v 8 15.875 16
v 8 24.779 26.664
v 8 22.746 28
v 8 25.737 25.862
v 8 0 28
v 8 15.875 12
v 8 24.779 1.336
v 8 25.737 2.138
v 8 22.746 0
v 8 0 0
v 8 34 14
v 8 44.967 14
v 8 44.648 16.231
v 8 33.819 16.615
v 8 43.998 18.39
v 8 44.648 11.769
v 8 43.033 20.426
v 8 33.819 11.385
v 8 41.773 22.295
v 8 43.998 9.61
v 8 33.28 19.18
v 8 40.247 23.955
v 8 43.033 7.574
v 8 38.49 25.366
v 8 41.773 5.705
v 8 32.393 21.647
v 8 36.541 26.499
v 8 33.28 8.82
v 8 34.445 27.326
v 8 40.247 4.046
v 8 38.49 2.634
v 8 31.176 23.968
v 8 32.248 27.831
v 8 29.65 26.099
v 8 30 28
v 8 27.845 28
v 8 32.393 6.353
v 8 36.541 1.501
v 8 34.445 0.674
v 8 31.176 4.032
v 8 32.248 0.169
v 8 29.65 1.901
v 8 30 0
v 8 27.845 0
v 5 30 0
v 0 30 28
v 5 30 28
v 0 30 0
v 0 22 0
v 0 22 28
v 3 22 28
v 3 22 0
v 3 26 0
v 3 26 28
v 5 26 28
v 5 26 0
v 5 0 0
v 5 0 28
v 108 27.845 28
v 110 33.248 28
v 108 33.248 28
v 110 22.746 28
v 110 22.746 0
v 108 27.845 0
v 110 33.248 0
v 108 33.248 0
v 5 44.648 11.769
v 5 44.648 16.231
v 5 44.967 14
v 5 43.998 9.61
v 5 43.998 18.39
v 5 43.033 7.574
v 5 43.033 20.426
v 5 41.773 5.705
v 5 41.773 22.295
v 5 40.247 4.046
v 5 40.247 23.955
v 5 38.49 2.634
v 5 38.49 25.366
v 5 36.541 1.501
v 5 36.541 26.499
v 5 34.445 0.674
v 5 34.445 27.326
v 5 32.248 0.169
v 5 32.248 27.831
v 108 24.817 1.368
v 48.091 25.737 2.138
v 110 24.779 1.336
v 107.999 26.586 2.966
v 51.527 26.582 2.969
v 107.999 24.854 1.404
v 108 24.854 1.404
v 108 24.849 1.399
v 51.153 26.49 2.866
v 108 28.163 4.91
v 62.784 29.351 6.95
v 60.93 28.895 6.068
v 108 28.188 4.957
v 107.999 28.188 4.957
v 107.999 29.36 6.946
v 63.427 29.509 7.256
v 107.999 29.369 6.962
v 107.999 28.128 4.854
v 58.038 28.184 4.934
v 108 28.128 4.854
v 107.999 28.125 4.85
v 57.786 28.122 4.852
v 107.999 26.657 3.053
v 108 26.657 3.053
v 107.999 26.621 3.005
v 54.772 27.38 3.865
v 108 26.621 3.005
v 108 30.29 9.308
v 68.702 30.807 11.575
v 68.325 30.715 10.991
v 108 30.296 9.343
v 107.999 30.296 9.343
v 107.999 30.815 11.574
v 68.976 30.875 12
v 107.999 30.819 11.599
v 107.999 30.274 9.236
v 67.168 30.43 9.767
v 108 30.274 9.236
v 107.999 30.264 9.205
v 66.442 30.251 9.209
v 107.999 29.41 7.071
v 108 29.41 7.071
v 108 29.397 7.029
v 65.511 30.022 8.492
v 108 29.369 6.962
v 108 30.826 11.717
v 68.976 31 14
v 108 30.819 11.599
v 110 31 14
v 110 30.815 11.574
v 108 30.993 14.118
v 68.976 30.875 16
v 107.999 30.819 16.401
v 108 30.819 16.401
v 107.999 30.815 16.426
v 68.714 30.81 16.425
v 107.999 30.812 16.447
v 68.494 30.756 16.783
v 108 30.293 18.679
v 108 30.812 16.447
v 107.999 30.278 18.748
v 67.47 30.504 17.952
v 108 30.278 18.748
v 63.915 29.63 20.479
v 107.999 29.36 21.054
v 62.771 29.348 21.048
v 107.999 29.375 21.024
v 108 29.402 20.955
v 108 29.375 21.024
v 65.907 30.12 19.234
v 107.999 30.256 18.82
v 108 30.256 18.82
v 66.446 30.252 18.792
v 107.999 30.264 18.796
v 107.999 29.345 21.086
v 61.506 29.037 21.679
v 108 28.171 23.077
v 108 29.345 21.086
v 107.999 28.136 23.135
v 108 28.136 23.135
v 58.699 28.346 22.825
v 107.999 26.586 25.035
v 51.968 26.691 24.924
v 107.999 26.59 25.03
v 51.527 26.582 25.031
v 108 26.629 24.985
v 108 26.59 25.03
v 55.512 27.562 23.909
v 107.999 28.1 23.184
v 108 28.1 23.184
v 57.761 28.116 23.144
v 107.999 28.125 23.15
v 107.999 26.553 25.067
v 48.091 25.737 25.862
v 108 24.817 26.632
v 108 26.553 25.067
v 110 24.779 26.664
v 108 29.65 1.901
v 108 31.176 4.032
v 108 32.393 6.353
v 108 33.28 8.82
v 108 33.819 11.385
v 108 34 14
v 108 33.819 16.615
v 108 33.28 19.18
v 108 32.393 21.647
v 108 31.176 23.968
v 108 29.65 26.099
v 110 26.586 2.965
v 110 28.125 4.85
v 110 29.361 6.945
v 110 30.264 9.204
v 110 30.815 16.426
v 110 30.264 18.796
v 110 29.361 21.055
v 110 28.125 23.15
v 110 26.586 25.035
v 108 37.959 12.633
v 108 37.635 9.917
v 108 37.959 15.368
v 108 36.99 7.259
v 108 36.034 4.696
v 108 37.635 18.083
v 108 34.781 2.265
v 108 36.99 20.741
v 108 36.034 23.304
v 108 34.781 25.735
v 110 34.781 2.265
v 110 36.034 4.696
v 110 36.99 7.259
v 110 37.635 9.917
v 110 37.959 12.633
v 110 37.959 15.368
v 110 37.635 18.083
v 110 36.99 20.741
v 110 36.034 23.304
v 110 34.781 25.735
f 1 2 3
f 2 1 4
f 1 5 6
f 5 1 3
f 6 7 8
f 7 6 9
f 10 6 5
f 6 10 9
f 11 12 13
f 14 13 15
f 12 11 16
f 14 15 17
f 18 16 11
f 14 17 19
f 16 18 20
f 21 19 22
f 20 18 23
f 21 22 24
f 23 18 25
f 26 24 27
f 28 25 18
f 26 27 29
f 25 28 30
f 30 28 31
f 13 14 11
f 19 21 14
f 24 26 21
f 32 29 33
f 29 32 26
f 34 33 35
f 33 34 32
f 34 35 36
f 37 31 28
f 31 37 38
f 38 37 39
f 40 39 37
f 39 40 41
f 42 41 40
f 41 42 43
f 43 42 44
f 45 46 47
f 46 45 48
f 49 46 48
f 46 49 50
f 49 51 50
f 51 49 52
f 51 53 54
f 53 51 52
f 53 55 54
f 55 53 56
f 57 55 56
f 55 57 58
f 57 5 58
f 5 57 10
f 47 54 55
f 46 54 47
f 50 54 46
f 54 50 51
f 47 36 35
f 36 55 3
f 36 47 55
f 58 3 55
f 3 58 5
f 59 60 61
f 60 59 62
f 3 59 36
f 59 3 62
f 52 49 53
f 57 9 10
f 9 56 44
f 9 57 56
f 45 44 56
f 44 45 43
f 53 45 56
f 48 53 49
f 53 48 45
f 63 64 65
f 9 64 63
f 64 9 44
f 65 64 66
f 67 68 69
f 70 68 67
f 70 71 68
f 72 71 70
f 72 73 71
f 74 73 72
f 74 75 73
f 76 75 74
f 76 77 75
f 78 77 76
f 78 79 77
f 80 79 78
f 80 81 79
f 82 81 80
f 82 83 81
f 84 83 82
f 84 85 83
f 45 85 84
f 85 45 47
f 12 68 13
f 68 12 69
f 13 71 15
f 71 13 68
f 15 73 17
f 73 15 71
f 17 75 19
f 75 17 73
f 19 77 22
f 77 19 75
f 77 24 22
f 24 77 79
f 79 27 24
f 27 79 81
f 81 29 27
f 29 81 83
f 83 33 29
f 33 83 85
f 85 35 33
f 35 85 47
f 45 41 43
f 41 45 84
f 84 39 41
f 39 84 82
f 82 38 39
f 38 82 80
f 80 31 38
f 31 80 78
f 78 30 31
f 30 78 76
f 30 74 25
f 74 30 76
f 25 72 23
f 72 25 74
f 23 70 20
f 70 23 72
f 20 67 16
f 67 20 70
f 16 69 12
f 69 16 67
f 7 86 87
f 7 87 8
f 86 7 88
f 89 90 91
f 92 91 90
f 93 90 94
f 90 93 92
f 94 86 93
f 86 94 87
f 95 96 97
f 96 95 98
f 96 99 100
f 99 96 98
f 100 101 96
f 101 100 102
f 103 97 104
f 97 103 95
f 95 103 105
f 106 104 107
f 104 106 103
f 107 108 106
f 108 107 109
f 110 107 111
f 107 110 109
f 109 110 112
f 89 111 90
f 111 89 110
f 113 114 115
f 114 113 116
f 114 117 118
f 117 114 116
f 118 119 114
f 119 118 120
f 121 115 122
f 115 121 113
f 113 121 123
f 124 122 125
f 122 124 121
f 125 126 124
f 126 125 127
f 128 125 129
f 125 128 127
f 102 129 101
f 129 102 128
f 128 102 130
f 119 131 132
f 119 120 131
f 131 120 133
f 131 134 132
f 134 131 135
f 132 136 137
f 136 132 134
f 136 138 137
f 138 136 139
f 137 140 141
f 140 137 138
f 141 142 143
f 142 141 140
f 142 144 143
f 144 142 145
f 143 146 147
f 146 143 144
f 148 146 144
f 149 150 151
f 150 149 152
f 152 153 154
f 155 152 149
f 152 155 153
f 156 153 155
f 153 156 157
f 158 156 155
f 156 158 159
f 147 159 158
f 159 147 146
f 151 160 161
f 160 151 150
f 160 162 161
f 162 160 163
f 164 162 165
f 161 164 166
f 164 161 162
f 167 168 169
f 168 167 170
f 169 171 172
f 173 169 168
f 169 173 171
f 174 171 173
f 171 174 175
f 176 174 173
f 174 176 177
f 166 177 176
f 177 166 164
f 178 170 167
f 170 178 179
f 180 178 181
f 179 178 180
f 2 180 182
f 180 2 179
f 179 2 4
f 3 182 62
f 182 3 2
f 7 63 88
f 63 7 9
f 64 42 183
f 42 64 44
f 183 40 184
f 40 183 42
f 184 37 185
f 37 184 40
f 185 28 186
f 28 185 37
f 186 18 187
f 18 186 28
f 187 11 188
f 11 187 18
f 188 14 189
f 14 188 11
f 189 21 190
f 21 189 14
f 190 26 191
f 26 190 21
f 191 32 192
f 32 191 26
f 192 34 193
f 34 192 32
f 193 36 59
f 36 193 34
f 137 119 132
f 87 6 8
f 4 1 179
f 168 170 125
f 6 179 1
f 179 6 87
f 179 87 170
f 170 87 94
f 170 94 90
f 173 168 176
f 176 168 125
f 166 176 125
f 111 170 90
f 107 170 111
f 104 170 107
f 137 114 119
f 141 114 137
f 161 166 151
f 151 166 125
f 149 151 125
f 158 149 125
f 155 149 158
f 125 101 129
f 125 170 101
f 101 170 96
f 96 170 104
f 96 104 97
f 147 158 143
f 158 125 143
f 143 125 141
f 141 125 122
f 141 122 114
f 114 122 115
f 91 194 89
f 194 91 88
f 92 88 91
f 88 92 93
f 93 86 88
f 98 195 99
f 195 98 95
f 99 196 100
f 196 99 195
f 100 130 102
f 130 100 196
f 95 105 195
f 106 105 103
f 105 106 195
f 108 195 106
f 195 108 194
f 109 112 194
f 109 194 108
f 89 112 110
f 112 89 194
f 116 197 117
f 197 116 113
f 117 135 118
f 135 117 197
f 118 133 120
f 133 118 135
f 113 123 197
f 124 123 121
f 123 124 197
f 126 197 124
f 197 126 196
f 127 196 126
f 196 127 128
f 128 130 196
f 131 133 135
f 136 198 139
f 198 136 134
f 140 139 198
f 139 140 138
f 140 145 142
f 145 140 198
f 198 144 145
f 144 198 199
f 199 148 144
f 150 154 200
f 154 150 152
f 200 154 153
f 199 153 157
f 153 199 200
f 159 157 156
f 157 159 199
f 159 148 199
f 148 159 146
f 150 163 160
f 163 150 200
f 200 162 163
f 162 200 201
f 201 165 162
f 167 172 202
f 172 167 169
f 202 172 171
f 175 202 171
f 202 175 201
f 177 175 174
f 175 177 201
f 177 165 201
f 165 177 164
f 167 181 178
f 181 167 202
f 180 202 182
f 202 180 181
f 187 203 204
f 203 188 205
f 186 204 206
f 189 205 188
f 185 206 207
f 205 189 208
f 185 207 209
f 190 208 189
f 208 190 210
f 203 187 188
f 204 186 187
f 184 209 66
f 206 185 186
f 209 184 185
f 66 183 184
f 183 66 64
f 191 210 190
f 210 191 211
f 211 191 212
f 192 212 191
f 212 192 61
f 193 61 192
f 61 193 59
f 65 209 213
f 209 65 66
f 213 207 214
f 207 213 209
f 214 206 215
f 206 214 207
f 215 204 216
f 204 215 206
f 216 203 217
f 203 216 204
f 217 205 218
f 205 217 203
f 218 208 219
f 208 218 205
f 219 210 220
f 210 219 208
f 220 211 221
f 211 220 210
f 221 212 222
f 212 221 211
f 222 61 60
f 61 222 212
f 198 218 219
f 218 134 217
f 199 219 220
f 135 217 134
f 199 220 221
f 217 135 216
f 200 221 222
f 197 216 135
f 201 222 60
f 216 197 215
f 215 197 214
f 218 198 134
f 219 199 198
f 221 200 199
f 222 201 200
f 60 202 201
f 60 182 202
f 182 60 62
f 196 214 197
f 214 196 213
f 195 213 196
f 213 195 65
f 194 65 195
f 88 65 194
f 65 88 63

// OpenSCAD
// Remix of "Spool Holder 1KG for NEO GRRF" ( http://www.thingiverse.com/thing:385773 ) by Luchador

// Laurenz 2014-07-06

// of spool holding middle part (use spool width + 5mm)
length = 100;



// Anfangsstueck mit Haken
difference(){
luchadorspool();
translate([8,0,0])cube([100,100,100]);
}

// Skalierter Mittelteil
translate([8,0,0])
scale([length/82,1,1])
translate([-8,0,0])
difference(){
luchadorspool();
union(){
cube([8-0.001,200,200]);
translate([90,0,0])cube([100,100,100]);
}
}

// Endstueck
translate([-82+length,0,0])
difference(){
luchadorspool();
translate([-1,-1,-1])cube([91-0.001,100,100]);
}

// created with STL to OpenSCAD converter ( http://www.thingiverse.com/thing:62666 ) ( http://jsfiddle.net/Riham/yzvGD/embedded/result/ )
module luchadorspool(scale) {polyhedron(
 points=[[8,24.779094696044922,26.663768768310547],[8,22.745990753173828,28.000051498413086],[8,0.00002421438694000244,28.000051498413086],[8,24.779094696044922,1.336330771446228],[8,25.736982345581055,2.1375997066497803],[8,15.874530792236328,12.00005054473877],[8,25.736982345581055,25.862499237060547],[8,24.779094696044922,26.663768768310547],[8,15.874530792236328,16.000051498413086],[8,15.874530792236328,16.000051498413086],[8,24.779094696044922,26.663768768310547],[8,0.00002421438694000244,28.000051498413086],[8,15.874530792236328,16.000051498413086],[8,0.00002421438694000244,28.000051498413086],[8,15.874530792236328,12.00005054473877],[8,15.874530792236328,12.00005054473877],[8,0.00002421438694000244,28.000051498413086],[8,0.00002421438694000244,0.000050000002374872565],[8,15.874530792236328,12.00005054473877],[8,0.00002421438694000244,0.000050000002374872565],[8,24.779094696044922,1.336330771446228],[8,24.779094696044922,1.336330771446228],[8,0.00002421438694000244,0.000050000002374872565],[8,22.745990753173828,0.000050000002374872565],[40.87483596801758,25.736982345581055,2.1375997066497803],[8,25.736982345581055,2.1375997066497803],[8,24.779094696044922,1.336330771446228],[92,26.586090087890625,2.965418577194214],[43.692378997802734,26.582246780395508,2.9689066410064697],[92,24.779094696044922,1.336330771446228],[92,24.779094696044922,1.336330771446228],[43.692378997802734,26.582246780395508,2.9689066410064697],[43.38553237915039,26.490190505981445,2.8655965328216553],[92,24.779094696044922,1.336330771446228],[43.38553237915039,26.490190505981445,2.8655965328216553],[40.87483596801758,25.736982345581055,2.1375997066497803],[51.4024772644043,28.895273208618164,6.067709445953369],[92,28.125194549560547,4.849645614624023],[52.92253112792969,29.35129165649414,6.950313568115234],[52.92253112792969,29.35129165649414,6.950313568115234],[92,28.125194549560547,4.849645614624023],[92,29.360822677612305,6.945445537567139],[52.92253112792969,29.35129165649414,6.950313568115234],[92,29.360822677612305,6.945445537567139],[53.44977569580078,29.509464263916016,7.256449222564697],[51.4024772644043,28.895273208618164,6.067709445953369],[49.031253814697266,28.18390655517578,4.934443950653076],[92,28.125194549560547,4.849645614624023],[92,28.125194549560547,4.849645614624023],[49.031253814697266,28.18390655517578,4.934443950653076],[48.824859619140625,28.12198829650879,4.852006435394287],[92,28.125194549560547,4.849645614624023],[48.824859619140625,28.12198829650879,4.852006435394287],[92,26.586090087890625,2.965418577194214],[92,26.586090087890625,2.965418577194214],[48.824859619140625,28.12198829650879,4.852006435394287],[46.35269546508789,27.380340576171875,3.864579439163208],[92,26.586090087890625,2.965418577194214],[46.35269546508789,27.380340576171875,3.864579439163208],[43.692378997802734,26.582246780395508,2.9689066410064697],[57.46689987182617,30.714601516723633,10.99138355255127],[92,30.264408111572266,9.204360961914062],[57.77556610107422,30.807201385498047,11.575401306152344],[57.77556610107422,30.807201385498047,11.575401306152344],[92,30.264408111572266,9.204360961914062],[92,30.81505012512207,11.5741605758667],[57.77556610107422,30.807201385498047,11.575401306152344],[92,30.81505012512207,11.5741605758667],[58,30.874530792236328,12.00005054473877],[57.46689987182617,30.714601516723633,10.99138355255127],[56.517704010009766,30.42984390258789,9.766770362854004],[92,30.264408111572266,9.204360961914062],[92,30.264408111572266,9.204360961914062],[56.517704010009766,30.42984390258789,9.766770362854004],[55.92249298095703,30.251279830932617,9.20854663848877],[92,30.264408111572266,9.204360961914062],[55.92249298095703,30.251279830932617,9.20854663848877],[92,29.360822677612305,6.945445537567139],[92,29.360822677612305,6.945445537567139],[55.92249298095703,30.251279830932617,9.20854663848877],[55.158836364746094,30.02218246459961,8.492351531982422],[92,29.360822677612305,6.945445537567139],[55.158836364746094,30.02218246459961,8.492351531982422],[53.44977569580078,29.509464263916016,7.256449222564697],[58,30.874530792236328,12.00005054473877],[92,30.81505012512207,11.5741605758667],[58,31.000022888183594,14.00005054473877],[58,31.000022888183594,14.00005054473877],[92,30.81505012512207,11.5741605758667],[92,31.000022888183594,14.00005054473877],[58,31.000022888183594,14.00005054473877],[92,31.000022888183594,14.00005054473877],[58,30.874530792236328,16.000051498413086],[58,30.874530792236328,16.000051498413086],[92,31.000022888183594,14.00005054473877],[92,30.81505012512207,16.425941467285156],[58,30.874530792236328,16.000051498413086],[92,30.81505012512207,16.425941467285156],[57.78570556640625,30.810243606567383,16.425212860107422],[57.78570556640625,30.810243606567383,16.425212860107422],[92,30.81505012512207,16.425941467285156],[57.60542297363281,30.75615882873535,16.782894134521484],[57.60542297363281,30.75615882873535,16.782894134521484],[92,30.81505012512207,16.425941467285156],[92,30.264408111572266,18.795740127563477],[57.60542297363281,30.75615882873535,16.782894134521484],[92,30.264408111572266,18.795740127563477],[56.765594482421875,30.504209518432617,17.952293395996094],[52.91258239746094,29.34830665588379,21.048480987548828],[53.850196838378906,29.62959098815918,20.47892189025879],[92,29.360822677612305,21.05465316772461],[92,29.360822677612305,21.05465316772461],[53.850196838378906,29.62959098815918,20.47892189025879],[55.484127044677734,30.119770050048828,19.23390769958496],[92,29.360822677612305,21.05465316772461],[55.484127044677734,30.119770050048828,19.23390769958496],[92,30.264408111572266,18.795740127563477],[92,30.264408111572266,18.795740127563477],[55.484127044677734,30.119770050048828,19.23390769958496],[55.9259033203125,30.252304077148438,18.792081832885742],[92,30.264408111572266,18.795740127563477],[55.9259033203125,30.252304077148438,18.792081832885742],[56.765594482421875,30.504209518432617,17.952293395996094],[52.91258239746094,29.34830665588379,21.048480987548828],[92,29.360822677612305,21.05465316772461],[51.87522506713867,29.037099838256836,21.678625106811523],[51.87522506713867,29.037099838256836,21.678625106811523],[92,29.360822677612305,21.05465316772461],[92,28.125194549560547,23.150455474853516],[51.87522506713867,29.037099838256836,21.678625106811523],[92,28.125194549560547,23.150455474853516],[49.573028564453125,28.3464412689209,22.824626922607422],[43.691871643066406,26.582094192504883,25.03069496154785],[44.053531646728516,26.69059181213379,24.923906326293945],[92,26.586090087890625,25.03468132019043],[92,26.586090087890625,25.03468132019043],[44.053531646728516,26.69059181213379,24.923906326293945],[46.9597053527832,27.562442779541016,23.90891456604004],[92,26.586090087890625,25.03468132019043],[46.9597053527832,27.562442779541016,23.90891456604004],[92,28.125194549560547,23.150455474853516],[92,28.125194549560547,23.150455474853516],[46.9597053527832,27.562442779541016,23.90891456604004],[48.80404281616211,28.11574363708496,23.143686294555664],[92,28.125194549560547,23.150455474853516],[48.80404281616211,28.11574363708496,23.143686294555664],[49.573028564453125,28.3464412689209,22.824626922607422],[43.691871643066406,26.582094192504883,25.03069496154785],[92,26.586090087890625,25.03468132019043],[40.87483596801758,25.736982345581055,25.862499237060547],[40.87483596801758,25.736982345581055,25.862499237060547],[92,26.586090087890625,25.03468132019043],[92,24.779094696044922,26.663768768310547],[40.87483596801758,25.736982345581055,25.862499237060547],[92,24.779094696044922,26.663768768310547],[8,25.736982345581055,25.862499237060547],[8,25.736982345581055,25.862499237060547],[92,24.779094696044922,26.663768768310547],[8,24.779094696044922,26.663768768310547],[8,24.779094696044922,26.663768768310547],[92,24.779094696044922,26.663768768310547],[92,22.745990753173828,28.000051498413086],[8,24.779094696044922,26.663768768310547],[92,22.745990753173828,28.000051498413086],[8,22.745990753173828,28.000051498413086],[40.87483596801758,25.736982345581055,2.1375997066497803],[8,24.779094696044922,1.336330771446228],[92,24.779094696044922,1.336330771446228],[92,24.779094696044922,1.336330771446228],[8,24.779094696044922,1.336330771446228],[8,22.745990753173828,0.000050000002374872565],[92,24.779094696044922,1.336330771446228],[8,22.745990753173828,0.000050000002374872565],[92,22.745990753173828,0.000050000002374872565],[2.423311710667139e-15,30.000022888183594,0.000050000002374872565],[2.423311710667139e-15,30.000022888183594,28.000051498413086],[5,30.000022888183594,0.000050000002374872565],[5,30.000022888183594,0.000050000002374872565],[2.423311710667139e-15,30.000022888183594,28.000051498413086],[5,30.000022888183594,28.000051498413086],[8,34.44451904296875,0.6736247539520264],[8,31.175521850585938,4.0324387550354],[8,29.64979362487793,1.9011133909225464],[8,27.845256805419922,0.000050000002374872565],[8,30.000022888183594,0.000050000002374872565],[8,29.64979362487793,1.9011133909225464],[8,29.64979362487793,1.9011133909225464],[8,30.000022888183594,0.000050000002374872565],[8,32.24764633178711,0.1693996638059616],[8,29.64979362487793,1.9011133909225464],[8,32.24764633178711,0.1693996638059616],[8,34.44451904296875,0.6736247539520264],[8,33.8192253112793,16.614952087402344],[8,43.03263854980469,20.426424026489258],[8,33.28026580810547,19.180086135864258],[8,33.28026580810547,19.180086135864258],[8,43.03263854980469,20.426424026489258],[8,41.77272033691406,22.295406341552734],[8,33.28026580810547,19.180086135864258],[8,41.77272033691406,22.295406341552734],[8,32.393402099609375,21.646636962890625],[8,43.03263854980469,7.573676586151123],[8,33.8192253112793,11.385149002075195],[8,33.28026580810547,8.820013999938965],[8,34.44451904296875,0.6736247539520264],[8,36.541038513183594,1.5013397932052612],[8,31.175521850585938,4.0324387550354],[8,31.175521850585938,4.0324387550354],[8,36.541038513183594,1.5013397932052612],[8,38.4898567199707,2.6338553428649902],[8,31.175521850585938,4.0324387550354],[8,38.4898567199707,2.6338553428649902],[8,32.393402099609375,6.353463172912598],[8,32.393402099609375,6.353463172912598],[8,38.4898567199707,2.6338553428649902],[8,40.24697494506836,4.04559850692749],[8,32.393402099609375,6.353463172912598],[8,40.24697494506836,4.04559850692749],[8,33.28026580810547,8.820013999938965],[8,33.28026580810547,8.820013999938965],[8,40.24697494506836,4.04559850692749],[8,41.77272033691406,5.704692840576172],[8,33.28026580810547,8.820013999938965],[8,41.77272033691406,5.704692840576172],[8,43.03263854980469,7.573676586151123],[8,30.000022888183594,28.000051498413086],[8,27.845256805419922,28.000051498413086],[8,32.24764633178711,27.83070182800293],[8,32.24764633178711,27.83070182800293],[8,27.845256805419922,28.000051498413086],[8,29.64979362487793,26.098987579345703],[8,32.24764633178711,27.83070182800293],[8,29.64979362487793,26.098987579345703],[8,34.44451904296875,27.326475143432617],[8,34.44451904296875,27.326475143432617],[8,29.64979362487793,26.098987579345703],[8,31.175521850585938,23.967660903930664],[8,41.77272033691406,22.295406341552734],[8,40.24697494506836,23.95450210571289],[8,32.393402099609375,21.646636962890625],[8,32.393402099609375,21.646636962890625],[8,40.24697494506836,23.95450210571289],[8,38.4898567199707,25.36624526977539],[8,32.393402099609375,21.646636962890625],[8,38.4898567199707,25.36624526977539],[8,31.175521850585938,23.967660903930664],[8,31.175521850585938,23.967660903930664],[8,38.4898567199707,25.36624526977539],[8,36.541038513183594,26.498760223388672],[8,31.175521850585938,23.967660903930664],[8,36.541038513183594,26.498760223388672],[8,34.44451904296875,27.326475143432617],[8,43.03263854980469,7.573676586151123],[8,43.9982795715332,9.610347747802734],[8,33.8192253112793,11.385149002075195],[8,33.8192253112793,11.385149002075195],[8,43.9982795715332,9.610347747802734],[8,44.6478385925293,11.768717765808105],[8,33.8192253112793,11.385149002075195],[8,44.6478385925293,11.768717765808105],[8,34.000022888183594,14.00005054473877],[8,44.6478385925293,11.768717765808105],[8,44.966651916503906,14.00005054473877],[8,34.000022888183594,14.00005054473877],[8,34.000022888183594,14.00005054473877],[8,44.966651916503906,14.00005054473877],[8,44.6478385925293,16.23138427734375],[8,34.000022888183594,14.00005054473877],[8,44.6478385925293,16.23138427734375],[8,33.8192253112793,16.614952087402344],[8,33.8192253112793,16.614952087402344],[8,44.6478385925293,16.23138427734375],[8,43.9982795715332,18.389753341674805],[8,33.8192253112793,16.614952087402344],[8,43.9982795715332,18.389753341674805],[8,43.03263854980469,20.426424026489258],[0,22.000024795532227,28.000051498413086],[2.423311710667139e-15,30.000022888183594,28.000051498413086],[0,22.000024795532227,0.000050000002374872565],[0,22.000024795532227,0.000050000002374872565],[2.423311710667139e-15,30.000022888183594,28.000051498413086],[2.423311710667139e-15,30.000022888183594,0.000050000002374872565],[3,22.000024795532227,28.000051498413086],[0,22.000024795532227,28.000051498413086],[3,22.000024795532227,0.000050000002374872565],[3,22.000024795532227,0.000050000002374872565],[0,22.000024795532227,28.000051498413086],[0,22.000024795532227,0.000050000002374872565],[3,26.000024795532227,28.000051498413086],[3,22.000024795532227,28.000051498413086],[3,26.000024795532227,0.000050000002374872565],[3,26.000024795532227,0.000050000002374872565],[3,22.000024795532227,28.000051498413086],[3,22.000024795532227,0.000050000002374872565],[5,26.000024795532227,28.000051498413086],[3,26.000024795532227,28.000051498413086],[5,26.000024795532227,0.000050000002374872565],[5,26.000024795532227,0.000050000002374872565],[3,26.000024795532227,28.000051498413086],[3,26.000024795532227,0.000050000002374872565],[5,0.00002421438694000244,28.000051498413086],[5,26.000024795532227,28.000051498413086],[5,0.00002421438694000244,0.000050000002374872565],[5,0.00002421438694000244,0.000050000002374872565],[5,26.000024795532227,28.000051498413086],[5,26.000024795532227,0.000050000002374872565],[8,0.00002421438694000244,28.000051498413086],[5,0.00002421438694000244,28.000051498413086],[8,0.00002421438694000244,0.000050000002374872565],[8,0.00002421438694000244,0.000050000002374872565],[5,0.00002421438694000244,28.000051498413086],[5,0.00002421438694000244,0.000050000002374872565],[0,22.000024795532227,28.000051498413086],[3,22.000024795532227,28.000051498413086],[2.423311710667139e-15,30.000022888183594,28.000051498413086],[2.423311710667139e-15,30.000022888183594,28.000051498413086],[3,22.000024795532227,28.000051498413086],[3,26.000024795532227,28.000051498413086],[2.423311710667139e-15,30.000022888183594,28.000051498413086],[3,26.000024795532227,28.000051498413086],[5,30.000022888183594,28.000051498413086],[5,30.000022888183594,28.000051498413086],[3,26.000024795532227,28.000051498413086],[5,26.000024795532227,28.000051498413086],[5,30.000022888183594,28.000051498413086],[5,26.000024795532227,28.000051498413086],[8,30.000022888183594,28.000051498413086],[8,30.000022888183594,28.000051498413086],[5,26.000024795532227,28.000051498413086],[8,27.845256805419922,28.000051498413086],[92,22.745990753173828,28.000051498413086],[92,33.248313903808594,28.000051498413086],[90,33.248313903808594,28.000051498413086],[5,0.00002421438694000244,28.000051498413086],[8,0.00002421438694000244,28.000051498413086],[5,26.000024795532227,28.000051498413086],[5,26.000024795532227,28.000051498413086],[8,0.00002421438694000244,28.000051498413086],[8,22.745990753173828,28.000051498413086],[5,26.000024795532227,28.000051498413086],[8,22.745990753173828,28.000051498413086],[8,27.845256805419922,28.000051498413086],[8,27.845256805419922,28.000051498413086],[8,22.745990753173828,28.000051498413086],[92,22.745990753173828,28.000051498413086],[8,27.845256805419922,28.000051498413086],[92,22.745990753173828,28.000051498413086],[90,27.845256805419922,28.000051498413086],[90,27.845256805419922,28.000051498413086],[92,22.745990753173828,28.000051498413086],[90,33.248313903808594,28.000051498413086],[8,22.745990753173828,0.000050000002374872565],[8,0.00002421438694000244,0.000050000002374872565],[5,0.00002421438694000244,0.000050000002374872565],[8,30.000022888183594,0.000050000002374872565],[8,27.845256805419922,0.000050000002374872565],[5,30.000022888183594,0.000050000002374872565],[5,30.000022888183594,0.000050000002374872565],[8,27.845256805419922,0.000050000002374872565],[5,26.000024795532227,0.000050000002374872565],[5,30.000022888183594,0.000050000002374872565],[5,26.000024795532227,0.000050000002374872565],[2.423311710667139e-15,30.000022888183594,0.000050000002374872565],[2.423311710667139e-15,30.000022888183594,0.000050000002374872565],[5,26.000024795532227,0.000050000002374872565],[3,26.000024795532227,0.000050000002374872565],[2.423311710667139e-15,30.000022888183594,0.000050000002374872565],[3,26.000024795532227,0.000050000002374872565],[0,22.000024795532227,0.000050000002374872565],[0,22.000024795532227,0.000050000002374872565],[3,26.000024795532227,0.000050000002374872565],[3,22.000024795532227,0.000050000002374872565],[90,33.248313903808594,0.000050000002374872565],[92,33.248313903808594,0.000050000002374872565],[90,27.845256805419922,0.000050000002374872565],[90,27.845256805419922,0.000050000002374872565],[92,33.248313903808594,0.000050000002374872565],[92,22.745990753173828,0.000050000002374872565],[90,27.845256805419922,0.000050000002374872565],[92,22.745990753173828,0.000050000002374872565],[8,27.845256805419922,0.000050000002374872565],[8,27.845256805419922,0.000050000002374872565],[92,22.745990753173828,0.000050000002374872565],[8,22.745990753173828,0.000050000002374872565],[8,27.845256805419922,0.000050000002374872565],[8,22.745990753173828,0.000050000002374872565],[5,26.000024795532227,0.000050000002374872565],[5,26.000024795532227,0.000050000002374872565],[8,22.745990753173828,0.000050000002374872565],[5,0.00002421438694000244,0.000050000002374872565],[90,27.845256805419922,0.000050000002374872565],[8,27.845256805419922,0.000050000002374872565],[8,29.64979362487793,1.9011133909225464],[90,27.845256805419922,0.000050000002374872565],[8,29.64979362487793,1.9011133909225464],[90,29.64979362487793,1.9011133909225464],[90,29.64979362487793,1.9011133909225464],[8,29.64979362487793,1.9011133909225464],[8,31.175521850585938,4.0324387550354],[90,29.64979362487793,1.9011133909225464],[8,31.175521850585938,4.0324387550354],[90,31.175521850585938,4.0324387550354],[90,31.175521850585938,4.0324387550354],[8,31.175521850585938,4.0324387550354],[8,32.393402099609375,6.353463172912598],[90,31.175521850585938,4.0324387550354],[8,32.393402099609375,6.353463172912598],[90,32.393402099609375,6.353463172912598],[90,32.393402099609375,6.353463172912598],[8,32.393402099609375,6.353463172912598],[8,33.28026580810547,8.820013999938965],[90,32.393402099609375,6.353463172912598],[8,33.28026580810547,8.820013999938965],[90,33.28026580810547,8.820013999938965],[90,33.28026580810547,8.820013999938965],[8,33.28026580810547,8.820013999938965],[8,33.8192253112793,11.385149002075195],[90,33.28026580810547,8.820013999938965],[8,33.8192253112793,11.385149002075195],[90,33.8192253112793,11.385149002075195],[90,33.8192253112793,11.385149002075195],[8,33.8192253112793,11.385149002075195],[8,34.000022888183594,14.00005054473877],[90,33.8192253112793,11.385149002075195],[8,34.000022888183594,14.00005054473877],[90,34.000022888183594,14.00005054473877],[90,34.000022888183594,14.00005054473877],[8,34.000022888183594,14.00005054473877],[8,33.8192253112793,16.614952087402344],[90,34.000022888183594,14.00005054473877],[8,33.8192253112793,16.614952087402344],[90,33.8192253112793,16.614952087402344],[90,33.8192253112793,16.614952087402344],[8,33.8192253112793,16.614952087402344],[8,33.28026580810547,19.180086135864258],[90,33.8192253112793,16.614952087402344],[8,33.28026580810547,19.180086135864258],[90,33.28026580810547,19.180086135864258],[90,33.28026580810547,19.180086135864258],[8,33.28026580810547,19.180086135864258],[8,32.393402099609375,21.646636962890625],[90,33.28026580810547,19.180086135864258],[8,32.393402099609375,21.646636962890625],[90,32.393402099609375,21.646636962890625],[90,32.393402099609375,21.646636962890625],[8,32.393402099609375,21.646636962890625],[8,31.175521850585938,23.967660903930664],[90,32.393402099609375,21.646636962890625],[8,31.175521850585938,23.967660903930664],[90,31.175521850585938,23.967660903930664],[90,31.175521850585938,23.967660903930664],[8,31.175521850585938,23.967660903930664],[8,29.64979362487793,26.098987579345703],[90,31.175521850585938,23.967660903930664],[8,29.64979362487793,26.098987579345703],[90,29.64979362487793,26.098987579345703],[90,29.64979362487793,26.098987579345703],[8,29.64979362487793,26.098987579345703],[8,27.845256805419922,28.000051498413086],[90,29.64979362487793,26.098987579345703],[8,27.845256805419922,28.000051498413086],[90,27.845256805419922,28.000051498413086],[90,29.64979362487793,26.098987579345703],[90,27.845256805419922,28.000051498413086],[90,33.248313903808594,28.000051498413086],[90,29.64979362487793,26.098987579345703],[90,33.248313903808594,28.000051498413086],[90,31.175521850585938,23.967660903930664],[90,31.175521850585938,23.967660903930664],[90,33.248313903808594,28.000051498413086],[90,34.78114700317383,25.734920501708984],[90,31.175521850585938,23.967660903930664],[90,34.78114700317383,25.734920501708984],[90,32.393402099609375,21.646636962890625],[90,32.393402099609375,21.646636962890625],[90,34.78114700317383,25.734920501708984],[90,36.034263610839844,23.303850173950195],[90,32.393402099609375,21.646636962890625],[90,36.034263610839844,23.303850173950195],[90,33.28026580810547,19.180086135864258],[90,33.28026580810547,19.180086135864258],[90,36.034263610839844,23.303850173950195],[90,36.98994445800781,20.74121856689453],[90,33.28026580810547,19.180086135864258],[90,36.98994445800781,20.74121856689453],[90,33.8192253112793,16.614952087402344],[90,36.98994445800781,20.74121856689453],[90,37.634674072265625,18.083261489868164],[90,33.8192253112793,16.614952087402344],[90,33.8192253112793,16.614952087402344],[90,37.634674072265625,18.083261489868164],[90,37.95933532714844,15.36756706237793],[90,33.8192253112793,16.614952087402344],[90,37.95933532714844,15.36756706237793],[90,34.000022888183594,14.00005054473877],[90,34.000022888183594,14.00005054473877],[90,37.95933532714844,15.36756706237793],[90,37.95933532714844,12.63253402709961],[90,34.000022888183594,14.00005054473877],[90,37.95933532714844,12.63253402709961],[90,33.8192253112793,11.385149002075195],[90,33.8192253112793,11.385149002075195],[90,37.95933532714844,12.63253402709961],[90,37.634674072265625,9.916838645935059],[90,33.8192253112793,11.385149002075195],[90,37.634674072265625,9.916838645935059],[90,33.28026580810547,8.820013999938965],[90,33.28026580810547,8.820013999938965],[90,37.634674072265625,9.916838645935059],[90,36.98994445800781,7.25888204574585],[90,33.28026580810547,8.820013999938965],[90,36.98994445800781,7.25888204574585],[90,32.393402099609375,6.353463172912598],[90,32.393402099609375,6.353463172912598],[90,36.98994445800781,7.25888204574585],[90,36.034263610839844,4.6962504386901855],[90,32.393402099609375,6.353463172912598],[90,36.034263610839844,4.6962504386901855],[90,31.175521850585938,4.0324387550354],[90,31.175521850585938,4.0324387550354],[90,36.034263610839844,4.6962504386901855],[90,34.78114700317383,2.265181064605713],[90,31.175521850585938,4.0324387550354],[90,34.78114700317383,2.265181064605713],[90,29.64979362487793,1.9011133909225464],[90,29.64979362487793,1.9011133909225464],[90,34.78114700317383,2.265181064605713],[90,33.248313903808594,0.000050000002374872565],[90,29.64979362487793,1.9011133909225464],[90,33.248313903808594,0.000050000002374872565],[90,27.845256805419922,0.000050000002374872565],[92,33.248313903808594,0.000050000002374872565],[90,33.248313903808594,0.000050000002374872565],[90,34.78114700317383,2.265181064605713],[92,33.248313903808594,0.000050000002374872565],[90,34.78114700317383,2.265181064605713],[92,34.78114700317383,2.265181064605713],[92,34.78114700317383,2.265181064605713],[90,34.78114700317383,2.265181064605713],[90,36.034263610839844,4.6962504386901855],[92,34.78114700317383,2.265181064605713],[90,36.034263610839844,4.6962504386901855],[92,36.034263610839844,4.6962504386901855],[92,36.034263610839844,4.6962504386901855],[90,36.034263610839844,4.6962504386901855],[90,36.98994445800781,7.25888204574585],[92,36.034263610839844,4.6962504386901855],[90,36.98994445800781,7.25888204574585],[92,36.98994445800781,7.25888204574585],[92,36.98994445800781,7.25888204574585],[90,36.98994445800781,7.25888204574585],[90,37.634674072265625,9.916838645935059],[92,36.98994445800781,7.25888204574585],[90,37.634674072265625,9.916838645935059],[92,37.634674072265625,9.916838645935059],[92,37.634674072265625,9.916838645935059],[90,37.634674072265625,9.916838645935059],[90,37.95933532714844,12.63253402709961],[92,37.634674072265625,9.916838645935059],[90,37.95933532714844,12.63253402709961],[92,37.95933532714844,12.63253402709961],[92,37.95933532714844,12.63253402709961],[90,37.95933532714844,12.63253402709961],[90,37.95933532714844,15.36756706237793],[92,37.95933532714844,12.63253402709961],[90,37.95933532714844,15.36756706237793],[92,37.95933532714844,15.36756706237793],[92,37.95933532714844,15.36756706237793],[90,37.95933532714844,15.36756706237793],[90,37.634674072265625,18.083261489868164],[92,37.95933532714844,15.36756706237793],[90,37.634674072265625,18.083261489868164],[92,37.634674072265625,18.083261489868164],[92,37.634674072265625,18.083261489868164],[90,37.634674072265625,18.083261489868164],[90,36.98994445800781,20.74121856689453],[92,37.634674072265625,18.083261489868164],[90,36.98994445800781,20.74121856689453],[92,36.98994445800781,20.74121856689453],[92,36.98994445800781,20.74121856689453],[90,36.98994445800781,20.74121856689453],[90,36.034263610839844,23.303850173950195],[92,36.98994445800781,20.74121856689453],[90,36.034263610839844,23.303850173950195],[92,36.034263610839844,23.303850173950195],[92,36.034263610839844,23.303850173950195],[90,36.034263610839844,23.303850173950195],[90,34.78114700317383,25.734920501708984],[92,36.034263610839844,23.303850173950195],[90,34.78114700317383,25.734920501708984],[92,34.78114700317383,25.734920501708984],[92,34.78114700317383,25.734920501708984],[90,34.78114700317383,25.734920501708984],[90,33.248313903808594,28.000051498413086],[92,34.78114700317383,25.734920501708984],[90,33.248313903808594,28.000051498413086],[92,33.248313903808594,28.000051498413086],[92,24.779094696044922,1.336330771446228],[92,22.745990753173828,0.000050000002374872565],[92,33.248313903808594,0.000050000002374872565],[92,33.248313903808594,28.000051498413086],[92,22.745990753173828,28.000051498413086],[92,24.779094696044922,26.663768768310547],[92,24.779094696044922,26.663768768310547],[92,26.586090087890625,25.03468132019043],[92,33.248313903808594,28.000051498413086],[92,33.248313903808594,28.000051498413086],[92,26.586090087890625,25.03468132019043],[92,28.125194549560547,23.150455474853516],[92,33.248313903808594,28.000051498413086],[92,28.125194549560547,23.150455474853516],[92,34.78114700317383,25.734920501708984],[92,34.78114700317383,25.734920501708984],[92,28.125194549560547,23.150455474853516],[92,29.360822677612305,21.05465316772461],[92,34.78114700317383,25.734920501708984],[92,29.360822677612305,21.05465316772461],[92,36.034263610839844,23.303850173950195],[92,36.034263610839844,23.303850173950195],[92,29.360822677612305,21.05465316772461],[92,36.98994445800781,20.74121856689453],[92,36.98994445800781,20.74121856689453],[92,29.360822677612305,21.05465316772461],[92,30.264408111572266,18.795740127563477],[92,36.98994445800781,20.74121856689453],[92,30.264408111572266,18.795740127563477],[92,37.634674072265625,18.083261489868164],[92,37.634674072265625,18.083261489868164],[92,30.264408111572266,18.795740127563477],[92,30.81505012512207,16.425941467285156],[92,37.634674072265625,18.083261489868164],[92,30.81505012512207,16.425941467285156],[92,37.95933532714844,15.36756706237793],[92,37.95933532714844,15.36756706237793],[92,30.81505012512207,16.425941467285156],[92,31.000022888183594,14.00005054473877],[92,37.95933532714844,15.36756706237793],[92,31.000022888183594,14.00005054473877],[92,37.95933532714844,12.63253402709961],[92,37.95933532714844,12.63253402709961],[92,31.000022888183594,14.00005054473877],[92,30.81505012512207,11.5741605758667],[92,37.95933532714844,12.63253402709961],[92,30.81505012512207,11.5741605758667],[92,37.634674072265625,9.916838645935059],[92,37.634674072265625,9.916838645935059],[92,30.81505012512207,11.5741605758667],[92,36.98994445800781,7.25888204574585],[92,36.98994445800781,7.25888204574585],[92,30.81505012512207,11.5741605758667],[92,30.264408111572266,9.204360961914062],[92,36.98994445800781,7.25888204574585],[92,30.264408111572266,9.204360961914062],[92,36.034263610839844,4.6962504386901855],[92,36.034263610839844,4.6962504386901855],[92,30.264408111572266,9.204360961914062],[92,29.360822677612305,6.945445537567139],[92,36.034263610839844,4.6962504386901855],[92,29.360822677612305,6.945445537567139],[92,34.78114700317383,2.265181064605713],[92,34.78114700317383,2.265181064605713],[92,29.360822677612305,6.945445537567139],[92,28.125194549560547,4.849645614624023],[92,34.78114700317383,2.265181064605713],[92,28.125194549560547,4.849645614624023],[92,33.248313903808594,0.000050000002374872565],[92,33.248313903808594,0.000050000002374872565],[92,28.125194549560547,4.849645614624023],[92,26.586090087890625,2.965418577194214],[92,33.248313903808594,0.000050000002374872565],[92,26.586090087890625,2.965418577194214],[92,24.779094696044922,1.336330771446228],[5,32.24764633178711,27.83070182800293],[5,41.77272033691406,22.295406341552734],[5,30.000022888183594,28.000051498413086],[5,30.000022888183594,28.000051498413086],[5,41.77272033691406,22.295406341552734],[5,43.03263854980469,20.426424026489258],[5,41.77272033691406,5.704692840576172],[5,30.000022888183594,28.000051498413086],[5,43.03263854980469,7.573676586151123],[5,43.03263854980469,7.573676586151123],[5,30.000022888183594,28.000051498413086],[5,44.6478385925293,11.768717765808105],[5,43.03263854980469,7.573676586151123],[5,44.6478385925293,11.768717765808105],[5,43.9982795715332,9.610347747802734],[5,30.000022888183594,0.000050000002374872565],[5,30.000022888183594,28.000051498413086],[5,32.24764633178711,0.1693996638059616],[5,32.24764633178711,0.1693996638059616],[5,30.000022888183594,28.000051498413086],[5,41.77272033691406,5.704692840576172],[5,32.24764633178711,0.1693996638059616],[5,41.77272033691406,5.704692840576172],[5,34.44451904296875,0.6736247539520264],[5,34.44451904296875,0.6736247539520264],[5,41.77272033691406,5.704692840576172],[5,40.24697494506836,4.04559850692749],[5,34.44451904296875,0.6736247539520264],[5,40.24697494506836,4.04559850692749],[5,36.541038513183594,1.5013397932052612],[5,36.541038513183594,1.5013397932052612],[5,40.24697494506836,4.04559850692749],[5,38.4898567199707,2.6338553428649902],[5,40.24697494506836,23.95450210571289],[5,41.77272033691406,22.295406341552734],[5,38.4898567199707,25.36624526977539],[5,38.4898567199707,25.36624526977539],[5,41.77272033691406,22.295406341552734],[5,32.24764633178711,27.83070182800293],[5,38.4898567199707,25.36624526977539],[5,32.24764633178711,27.83070182800293],[5,36.541038513183594,26.498760223388672],[5,36.541038513183594,26.498760223388672],[5,32.24764633178711,27.83070182800293],[5,34.44451904296875,27.326475143432617],[5,44.966651916503906,14.00005054473877],[5,44.6478385925293,11.768717765808105],[5,44.6478385925293,16.23138427734375],[5,44.6478385925293,16.23138427734375],[5,44.6478385925293,11.768717765808105],[5,30.000022888183594,28.000051498413086],[5,44.6478385925293,16.23138427734375],[5,30.000022888183594,28.000051498413086],[5,43.9982795715332,18.389753341674805],[5,43.9982795715332,18.389753341674805],[5,30.000022888183594,28.000051498413086],[5,43.03263854980469,20.426424026489258],[8,44.966651916503906,14.00005054473877],[5,44.966651916503906,14.00005054473877],[5,44.6478385925293,16.23138427734375],[8,44.966651916503906,14.00005054473877],[5,44.6478385925293,16.23138427734375],[8,44.6478385925293,16.23138427734375],[8,44.6478385925293,16.23138427734375],[5,44.6478385925293,16.23138427734375],[5,43.9982795715332,18.389753341674805],[8,44.6478385925293,16.23138427734375],[5,43.9982795715332,18.389753341674805],[8,43.9982795715332,18.389753341674805],[8,43.9982795715332,18.389753341674805],[5,43.9982795715332,18.389753341674805],[5,43.03263854980469,20.426424026489258],[8,43.9982795715332,18.389753341674805],[5,43.03263854980469,20.426424026489258],[8,43.03263854980469,20.426424026489258],[8,43.03263854980469,20.426424026489258],[5,43.03263854980469,20.426424026489258],[5,41.77272033691406,22.295406341552734],[8,43.03263854980469,20.426424026489258],[5,41.77272033691406,22.295406341552734],[8,41.77272033691406,22.295406341552734],[8,41.77272033691406,22.295406341552734],[5,41.77272033691406,22.295406341552734],[5,40.24697494506836,23.95450210571289],[8,41.77272033691406,22.295406341552734],[5,40.24697494506836,23.95450210571289],[8,40.24697494506836,23.95450210571289],[8,40.24697494506836,23.95450210571289],[5,40.24697494506836,23.95450210571289],[5,38.4898567199707,25.36624526977539],[8,40.24697494506836,23.95450210571289],[5,38.4898567199707,25.36624526977539],[8,38.4898567199707,25.36624526977539],[8,38.4898567199707,25.36624526977539],[5,38.4898567199707,25.36624526977539],[5,36.541038513183594,26.498760223388672],[8,38.4898567199707,25.36624526977539],[5,36.541038513183594,26.498760223388672],[8,36.541038513183594,26.498760223388672],[8,36.541038513183594,26.498760223388672],[5,36.541038513183594,26.498760223388672],[5,34.44451904296875,27.326475143432617],[8,36.541038513183594,26.498760223388672],[5,34.44451904296875,27.326475143432617],[8,34.44451904296875,27.326475143432617],[8,34.44451904296875,27.326475143432617],[5,34.44451904296875,27.326475143432617],[5,32.24764633178711,27.83070182800293],[8,34.44451904296875,27.326475143432617],[5,32.24764633178711,27.83070182800293],[8,32.24764633178711,27.83070182800293],[8,32.24764633178711,27.83070182800293],[5,32.24764633178711,27.83070182800293],[5,30.000022888183594,28.000051498413086],[8,32.24764633178711,27.83070182800293],[5,30.000022888183594,28.000051498413086],[8,30.000022888183594,28.000051498413086],[8,30.000022888183594,0.000050000002374872565],[5,30.000022888183594,0.000050000002374872565],[5,32.24764633178711,0.1693996638059616],[8,30.000022888183594,0.000050000002374872565],[5,32.24764633178711,0.1693996638059616],[8,32.24764633178711,0.1693996638059616],[8,32.24764633178711,0.1693996638059616],[5,32.24764633178711,0.1693996638059616],[5,34.44451904296875,0.6736247539520264],[8,32.24764633178711,0.1693996638059616],[5,34.44451904296875,0.6736247539520264],[8,34.44451904296875,0.6736247539520264],[8,34.44451904296875,0.6736247539520264],[5,34.44451904296875,0.6736247539520264],[5,36.541038513183594,1.5013397932052612],[8,34.44451904296875,0.6736247539520264],[5,36.541038513183594,1.5013397932052612],[8,36.541038513183594,1.5013397932052612],[8,36.541038513183594,1.5013397932052612],[5,36.541038513183594,1.5013397932052612],[5,38.4898567199707,2.6338553428649902],[8,36.541038513183594,1.5013397932052612],[5,38.4898567199707,2.6338553428649902],[8,38.4898567199707,2.6338553428649902],[8,38.4898567199707,2.6338553428649902],[5,38.4898567199707,2.6338553428649902],[5,40.24697494506836,4.04559850692749],[8,38.4898567199707,2.6338553428649902],[5,40.24697494506836,4.04559850692749],[8,40.24697494506836,4.04559850692749],[8,40.24697494506836,4.04559850692749],[5,40.24697494506836,4.04559850692749],[5,41.77272033691406,5.704692840576172],[8,40.24697494506836,4.04559850692749],[5,41.77272033691406,5.704692840576172],[8,41.77272033691406,5.704692840576172],[8,41.77272033691406,5.704692840576172],[5,41.77272033691406,5.704692840576172],[5,43.03263854980469,7.573676586151123],[8,41.77272033691406,5.704692840576172],[5,43.03263854980469,7.573676586151123],[8,43.03263854980469,7.573676586151123],[8,43.03263854980469,7.573676586151123],[5,43.03263854980469,7.573676586151123],[5,43.9982795715332,9.610347747802734],[8,43.03263854980469,7.573676586151123],[5,43.9982795715332,9.610347747802734],[8,43.9982795715332,9.610347747802734],[8,43.9982795715332,9.610347747802734],[5,43.9982795715332,9.610347747802734],[5,44.6478385925293,11.768717765808105],[8,43.9982795715332,9.610347747802734],[5,44.6478385925293,11.768717765808105],[8,44.6478385925293,11.768717765808105],[8,44.6478385925293,11.768717765808105],[5,44.6478385925293,11.768717765808105],[5,44.966651916503906,14.00005054473877],[8,44.6478385925293,11.768717765808105],[5,44.966651916503906,14.00005054473877],[8,44.966651916503906,14.00005054473877],[58,31.000022888183594,14.00005054473877],[58,30.874530792236328,16.000051498413086],[58,30.874530792236328,12.00005054473877],[40.87483596801758,25.736982345581055,2.1375997066497803],[8,15.874530792236328,12.00005054473877],[8,25.736982345581055,2.1375997066497803],[8,15.874530792236328,16.000051498413086],[40.87483596801758,25.736982345581055,25.862499237060547],[8,25.736982345581055,25.862499237060547],[44.053531646728516,26.69059181213379,24.923906326293945],[43.691871643066406,26.582094192504883,25.03069496154785],[55.92249298095703,30.251279830932617,9.20854663848877],[8,15.874530792236328,16.000051498413086],[8,15.874530792236328,12.00005054473877],[40.87483596801758,25.736982345581055,25.862499237060547],[40.87483596801758,25.736982345581055,25.862499237060547],[8,15.874530792236328,12.00005054473877],[40.87483596801758,25.736982345581055,2.1375997066497803],[40.87483596801758,25.736982345581055,25.862499237060547],[40.87483596801758,25.736982345581055,2.1375997066497803],[43.691871643066406,26.582094192504883,25.03069496154785],[43.691871643066406,26.582094192504883,25.03069496154785],[40.87483596801758,25.736982345581055,2.1375997066497803],[43.38553237915039,26.490190505981445,2.8655965328216553],[43.691871643066406,26.582094192504883,25.03069496154785],[43.38553237915039,26.490190505981445,2.8655965328216553],[43.692378997802734,26.582246780395508,2.9689066410064697],[46.9597053527832,27.562442779541016,23.90891456604004],[44.053531646728516,26.69059181213379,24.923906326293945],[48.80404281616211,28.11574363708496,23.143686294555664],[48.80404281616211,28.11574363708496,23.143686294555664],[44.053531646728516,26.69059181213379,24.923906326293945],[55.92249298095703,30.251279830932617,9.20854663848877],[48.80404281616211,28.11574363708496,23.143686294555664],[55.92249298095703,30.251279830932617,9.20854663848877],[49.573028564453125,28.3464412689209,22.824626922607422],[43.692378997802734,26.582246780395508,2.9689066410064697],[46.35269546508789,27.380340576171875,3.864579439163208],[43.691871643066406,26.582094192504883,25.03069496154785],[43.691871643066406,26.582094192504883,25.03069496154785],[46.35269546508789,27.380340576171875,3.864579439163208],[48.824859619140625,28.12198829650879,4.852006435394287],[43.691871643066406,26.582094192504883,25.03069496154785],[48.824859619140625,28.12198829650879,4.852006435394287],[49.031253814697266,28.18390655517578,4.934443950653076],[58,30.874530792236328,12.00005054473877],[58,30.874530792236328,16.000051498413086],[57.77556610107422,30.807201385498047,11.575401306152344],[57.77556610107422,30.807201385498047,11.575401306152344],[58,30.874530792236328,16.000051498413086],[57.78570556640625,30.810243606567383,16.425212860107422],[51.87522506713867,29.037099838256836,21.678625106811523],[49.573028564453125,28.3464412689209,22.824626922607422],[52.91258239746094,29.34830665588379,21.048480987548828],[52.91258239746094,29.34830665588379,21.048480987548828],[49.573028564453125,28.3464412689209,22.824626922607422],[55.92249298095703,30.251279830932617,9.20854663848877],[52.91258239746094,29.34830665588379,21.048480987548828],[55.92249298095703,30.251279830932617,9.20854663848877],[53.850196838378906,29.62959098815918,20.47892189025879],[53.850196838378906,29.62959098815918,20.47892189025879],[55.92249298095703,30.251279830932617,9.20854663848877],[55.9259033203125,30.252304077148438,18.792081832885742],[53.850196838378906,29.62959098815918,20.47892189025879],[55.9259033203125,30.252304077148438,18.792081832885742],[55.484127044677734,30.119770050048828,19.23390769958496],[55.158836364746094,30.02218246459961,8.492351531982422],[55.92249298095703,30.251279830932617,9.20854663848877],[53.44977569580078,29.509464263916016,7.256449222564697],[53.44977569580078,29.509464263916016,7.256449222564697],[55.92249298095703,30.251279830932617,9.20854663848877],[43.691871643066406,26.582094192504883,25.03069496154785],[53.44977569580078,29.509464263916016,7.256449222564697],[43.691871643066406,26.582094192504883,25.03069496154785],[52.92253112792969,29.35129165649414,6.950313568115234],[52.92253112792969,29.35129165649414,6.950313568115234],[43.691871643066406,26.582094192504883,25.03069496154785],[49.031253814697266,28.18390655517578,4.934443950653076],[52.92253112792969,29.35129165649414,6.950313568115234],[49.031253814697266,28.18390655517578,4.934443950653076],[51.4024772644043,28.895273208618164,6.067709445953369],[56.765594482421875,30.504209518432617,17.952293395996094],[55.9259033203125,30.252304077148438,18.792081832885742],[57.60542297363281,30.75615882873535,16.782894134521484],[57.60542297363281,30.75615882873535,16.782894134521484],[55.9259033203125,30.252304077148438,18.792081832885742],[55.92249298095703,30.251279830932617,9.20854663848877],[57.60542297363281,30.75615882873535,16.782894134521484],[55.92249298095703,30.251279830932617,9.20854663848877],[57.78570556640625,30.810243606567383,16.425212860107422],[57.78570556640625,30.810243606567383,16.425212860107422],[55.92249298095703,30.251279830932617,9.20854663848877],[56.517704010009766,30.42984390258789,9.766770362854004],[57.78570556640625,30.810243606567383,16.425212860107422],[56.517704010009766,30.42984390258789,9.766770362854004],[57.77556610107422,30.807201385498047,11.575401306152344],[57.77556610107422,30.807201385498047,11.575401306152344],[56.517704010009766,30.42984390258789,9.766770362854004],[57.46689987182617,30.714601516723633,10.99138355255127] ],
triangles=[[0,1,2],[3,4,5],[6,7,8],[9,10,11],[12,13,14],[15,16,17],[18,19,20],[21,22,23],[24,25,26],[27,28,29],[30,31,32],[33,34,35],[36,37,38],[39,40,41],[42,43,44],[45,46,47],[48,49,50],[51,52,53],[54,55,56],[57,58,59],[60,61,62],[63,64,65],[66,67,68],[69,70,71],[72,73,74],[75,76,77],[78,79,80],[81,82,83],[84,85,86],[87,88,89],[90,91,92],[93,94,95],[96,97,98],[99,100,101],[102,103,104],[105,106,107],[108,109,110],[111,112,113],[114,115,116],[117,118,119],[120,121,122],[123,124,125],[126,127,128],[129,130,131],[132,133,134],[135,136,137],[138,139,140],[141,142,143],[144,145,146],[147,148,149],[150,151,152],[153,154,155],[156,157,158],[159,160,161],[162,163,164],[165,166,167],[168,169,170],[171,172,173],[174,175,176],[177,178,179],[180,181,182],[183,184,185],[186,187,188],[189,190,191],[192,193,194],[195,196,197],[198,199,200],[201,202,203],[204,205,206],[207,208,209],[210,211,212],[213,214,215],[216,217,218],[219,220,221],[222,223,224],[225,226,227],[228,229,230],[231,232,233],[234,235,236],[237,238,239],[240,241,242],[243,244,245],[246,247,248],[249,250,251],[252,253,254],[255,256,257],[258,259,260],[261,262,263],[264,265,266],[267,268,269],[270,271,272],[273,274,275],[276,277,278],[279,280,281],[282,283,284],[285,286,287],[288,289,290],[291,292,293],[294,295,296],[297,298,299],[300,301,302],[303,304,305],[306,307,308],[309,310,311],[312,313,314],[315,316,317],[318,319,320],[321,322,323],[324,325,326],[327,328,329],[330,331,332],[333,334,335],[336,337,338],[339,340,341],[342,343,344],[345,346,347],[348,349,350],[351,352,353],[354,355,356],[357,358,359],[360,361,362],[363,364,365],[366,367,368],[369,370,371],[372,373,374],[375,376,377],[378,379,380],[381,382,383],[384,385,386],[387,388,389],[390,391,392],[393,394,395],[396,397,398],[399,400,401],[402,403,404],[405,406,407],[408,409,410],[411,412,413],[414,415,416],[417,418,419],[420,421,422],[423,424,425],[426,427,428],[429,430,431],[432,433,434],[435,436,437],[438,439,440],[441,442,443],[444,445,446],[447,448,449],[450,451,452],[453,454,455],[456,457,458],[459,460,461],[462,463,464],[465,466,467],[468,469,470],[471,472,473],[474,475,476],[477,478,479],[480,481,482],[483,484,485],[486,487,488],[489,490,491],[492,493,494],[495,496,497],[498,499,500],[501,502,503],[504,505,506],[507,508,509],[510,511,512],[513,514,515],[516,517,518],[519,520,521],[522,523,524],[525,526,527],[528,529,530],[531,532,533],[534,535,536],[537,538,539],[540,541,542],[543,544,545],[546,547,548],[549,550,551],[552,553,554],[555,556,557],[558,559,560],[561,562,563],[564,565,566],[567,568,569],[570,571,572],[573,574,575],[576,577,578],[579,580,581],[582,583,584],[585,586,587],[588,589,590],[591,592,593],[594,595,596],[597,598,599],[600,601,602],[603,604,605],[606,607,608],[609,610,611],[612,613,614],[615,616,617],[618,619,620],[621,622,623],[624,625,626],[627,628,629],[630,631,632],[633,634,635],[636,637,638],[639,640,641],[642,643,644],[645,646,647],[648,649,650],[651,652,653],[654,655,656],[657,658,659],[660,661,662],[663,664,665],[666,667,668],[669,670,671],[672,673,674],[675,676,677],[678,679,680],[681,682,683],[684,685,686],[687,688,689],[690,691,692],[693,694,695],[696,697,698],[699,700,701],[702,703,704],[705,706,707],[708,709,710],[711,712,713],[714,715,716],[717,718,719],[720,721,722],[723,724,725],[726,727,728],[729,730,731],[732,733,734],[735,736,737],[738,739,740],[741,742,743],[744,745,746],[747,748,749],[750,751,752],[753,754,755],[756,757,758],[759,760,761],[762,763,764],[765,766,767],[768,769,770],[771,772,773],[774,775,776],[777,778,779],[780,781,782],[783,784,785],[786,787,788],[789,790,791],[792,793,794],[795,796,797],[798,799,800],[801,802,803],[804,805,806],[807,808,809],[810,811,812],[813,814,815],[816,817,818],[819,820,821],[822,823,824],[825,826,827],[828,829,830],[831,832,833],[834,835,836],[837,838,839],[840,841,842],[843,844,845],[846,847,848],[849,850,851],[852,853,854],[855,856,857],[858,859,860],[861,862,863],[864,865,866],[867,868,869],[870,871,872],[873,874,875],[876,877,878],[879,880,881],[882,883,884],[885,886,887],[888,889,890],[891,892,893],[894,895,896],[897,898,899],[900,901,902],[903,904,905],[906,907,908],[909,910,911],[912,913,914],[915,916,917],[918,919,920],[921,922,923],[924,925,926],[927,928,929],[930,931,932],[933,934,935],[936,937,938],[939,940,941],[942,943,944],[945,946,947]]);}
